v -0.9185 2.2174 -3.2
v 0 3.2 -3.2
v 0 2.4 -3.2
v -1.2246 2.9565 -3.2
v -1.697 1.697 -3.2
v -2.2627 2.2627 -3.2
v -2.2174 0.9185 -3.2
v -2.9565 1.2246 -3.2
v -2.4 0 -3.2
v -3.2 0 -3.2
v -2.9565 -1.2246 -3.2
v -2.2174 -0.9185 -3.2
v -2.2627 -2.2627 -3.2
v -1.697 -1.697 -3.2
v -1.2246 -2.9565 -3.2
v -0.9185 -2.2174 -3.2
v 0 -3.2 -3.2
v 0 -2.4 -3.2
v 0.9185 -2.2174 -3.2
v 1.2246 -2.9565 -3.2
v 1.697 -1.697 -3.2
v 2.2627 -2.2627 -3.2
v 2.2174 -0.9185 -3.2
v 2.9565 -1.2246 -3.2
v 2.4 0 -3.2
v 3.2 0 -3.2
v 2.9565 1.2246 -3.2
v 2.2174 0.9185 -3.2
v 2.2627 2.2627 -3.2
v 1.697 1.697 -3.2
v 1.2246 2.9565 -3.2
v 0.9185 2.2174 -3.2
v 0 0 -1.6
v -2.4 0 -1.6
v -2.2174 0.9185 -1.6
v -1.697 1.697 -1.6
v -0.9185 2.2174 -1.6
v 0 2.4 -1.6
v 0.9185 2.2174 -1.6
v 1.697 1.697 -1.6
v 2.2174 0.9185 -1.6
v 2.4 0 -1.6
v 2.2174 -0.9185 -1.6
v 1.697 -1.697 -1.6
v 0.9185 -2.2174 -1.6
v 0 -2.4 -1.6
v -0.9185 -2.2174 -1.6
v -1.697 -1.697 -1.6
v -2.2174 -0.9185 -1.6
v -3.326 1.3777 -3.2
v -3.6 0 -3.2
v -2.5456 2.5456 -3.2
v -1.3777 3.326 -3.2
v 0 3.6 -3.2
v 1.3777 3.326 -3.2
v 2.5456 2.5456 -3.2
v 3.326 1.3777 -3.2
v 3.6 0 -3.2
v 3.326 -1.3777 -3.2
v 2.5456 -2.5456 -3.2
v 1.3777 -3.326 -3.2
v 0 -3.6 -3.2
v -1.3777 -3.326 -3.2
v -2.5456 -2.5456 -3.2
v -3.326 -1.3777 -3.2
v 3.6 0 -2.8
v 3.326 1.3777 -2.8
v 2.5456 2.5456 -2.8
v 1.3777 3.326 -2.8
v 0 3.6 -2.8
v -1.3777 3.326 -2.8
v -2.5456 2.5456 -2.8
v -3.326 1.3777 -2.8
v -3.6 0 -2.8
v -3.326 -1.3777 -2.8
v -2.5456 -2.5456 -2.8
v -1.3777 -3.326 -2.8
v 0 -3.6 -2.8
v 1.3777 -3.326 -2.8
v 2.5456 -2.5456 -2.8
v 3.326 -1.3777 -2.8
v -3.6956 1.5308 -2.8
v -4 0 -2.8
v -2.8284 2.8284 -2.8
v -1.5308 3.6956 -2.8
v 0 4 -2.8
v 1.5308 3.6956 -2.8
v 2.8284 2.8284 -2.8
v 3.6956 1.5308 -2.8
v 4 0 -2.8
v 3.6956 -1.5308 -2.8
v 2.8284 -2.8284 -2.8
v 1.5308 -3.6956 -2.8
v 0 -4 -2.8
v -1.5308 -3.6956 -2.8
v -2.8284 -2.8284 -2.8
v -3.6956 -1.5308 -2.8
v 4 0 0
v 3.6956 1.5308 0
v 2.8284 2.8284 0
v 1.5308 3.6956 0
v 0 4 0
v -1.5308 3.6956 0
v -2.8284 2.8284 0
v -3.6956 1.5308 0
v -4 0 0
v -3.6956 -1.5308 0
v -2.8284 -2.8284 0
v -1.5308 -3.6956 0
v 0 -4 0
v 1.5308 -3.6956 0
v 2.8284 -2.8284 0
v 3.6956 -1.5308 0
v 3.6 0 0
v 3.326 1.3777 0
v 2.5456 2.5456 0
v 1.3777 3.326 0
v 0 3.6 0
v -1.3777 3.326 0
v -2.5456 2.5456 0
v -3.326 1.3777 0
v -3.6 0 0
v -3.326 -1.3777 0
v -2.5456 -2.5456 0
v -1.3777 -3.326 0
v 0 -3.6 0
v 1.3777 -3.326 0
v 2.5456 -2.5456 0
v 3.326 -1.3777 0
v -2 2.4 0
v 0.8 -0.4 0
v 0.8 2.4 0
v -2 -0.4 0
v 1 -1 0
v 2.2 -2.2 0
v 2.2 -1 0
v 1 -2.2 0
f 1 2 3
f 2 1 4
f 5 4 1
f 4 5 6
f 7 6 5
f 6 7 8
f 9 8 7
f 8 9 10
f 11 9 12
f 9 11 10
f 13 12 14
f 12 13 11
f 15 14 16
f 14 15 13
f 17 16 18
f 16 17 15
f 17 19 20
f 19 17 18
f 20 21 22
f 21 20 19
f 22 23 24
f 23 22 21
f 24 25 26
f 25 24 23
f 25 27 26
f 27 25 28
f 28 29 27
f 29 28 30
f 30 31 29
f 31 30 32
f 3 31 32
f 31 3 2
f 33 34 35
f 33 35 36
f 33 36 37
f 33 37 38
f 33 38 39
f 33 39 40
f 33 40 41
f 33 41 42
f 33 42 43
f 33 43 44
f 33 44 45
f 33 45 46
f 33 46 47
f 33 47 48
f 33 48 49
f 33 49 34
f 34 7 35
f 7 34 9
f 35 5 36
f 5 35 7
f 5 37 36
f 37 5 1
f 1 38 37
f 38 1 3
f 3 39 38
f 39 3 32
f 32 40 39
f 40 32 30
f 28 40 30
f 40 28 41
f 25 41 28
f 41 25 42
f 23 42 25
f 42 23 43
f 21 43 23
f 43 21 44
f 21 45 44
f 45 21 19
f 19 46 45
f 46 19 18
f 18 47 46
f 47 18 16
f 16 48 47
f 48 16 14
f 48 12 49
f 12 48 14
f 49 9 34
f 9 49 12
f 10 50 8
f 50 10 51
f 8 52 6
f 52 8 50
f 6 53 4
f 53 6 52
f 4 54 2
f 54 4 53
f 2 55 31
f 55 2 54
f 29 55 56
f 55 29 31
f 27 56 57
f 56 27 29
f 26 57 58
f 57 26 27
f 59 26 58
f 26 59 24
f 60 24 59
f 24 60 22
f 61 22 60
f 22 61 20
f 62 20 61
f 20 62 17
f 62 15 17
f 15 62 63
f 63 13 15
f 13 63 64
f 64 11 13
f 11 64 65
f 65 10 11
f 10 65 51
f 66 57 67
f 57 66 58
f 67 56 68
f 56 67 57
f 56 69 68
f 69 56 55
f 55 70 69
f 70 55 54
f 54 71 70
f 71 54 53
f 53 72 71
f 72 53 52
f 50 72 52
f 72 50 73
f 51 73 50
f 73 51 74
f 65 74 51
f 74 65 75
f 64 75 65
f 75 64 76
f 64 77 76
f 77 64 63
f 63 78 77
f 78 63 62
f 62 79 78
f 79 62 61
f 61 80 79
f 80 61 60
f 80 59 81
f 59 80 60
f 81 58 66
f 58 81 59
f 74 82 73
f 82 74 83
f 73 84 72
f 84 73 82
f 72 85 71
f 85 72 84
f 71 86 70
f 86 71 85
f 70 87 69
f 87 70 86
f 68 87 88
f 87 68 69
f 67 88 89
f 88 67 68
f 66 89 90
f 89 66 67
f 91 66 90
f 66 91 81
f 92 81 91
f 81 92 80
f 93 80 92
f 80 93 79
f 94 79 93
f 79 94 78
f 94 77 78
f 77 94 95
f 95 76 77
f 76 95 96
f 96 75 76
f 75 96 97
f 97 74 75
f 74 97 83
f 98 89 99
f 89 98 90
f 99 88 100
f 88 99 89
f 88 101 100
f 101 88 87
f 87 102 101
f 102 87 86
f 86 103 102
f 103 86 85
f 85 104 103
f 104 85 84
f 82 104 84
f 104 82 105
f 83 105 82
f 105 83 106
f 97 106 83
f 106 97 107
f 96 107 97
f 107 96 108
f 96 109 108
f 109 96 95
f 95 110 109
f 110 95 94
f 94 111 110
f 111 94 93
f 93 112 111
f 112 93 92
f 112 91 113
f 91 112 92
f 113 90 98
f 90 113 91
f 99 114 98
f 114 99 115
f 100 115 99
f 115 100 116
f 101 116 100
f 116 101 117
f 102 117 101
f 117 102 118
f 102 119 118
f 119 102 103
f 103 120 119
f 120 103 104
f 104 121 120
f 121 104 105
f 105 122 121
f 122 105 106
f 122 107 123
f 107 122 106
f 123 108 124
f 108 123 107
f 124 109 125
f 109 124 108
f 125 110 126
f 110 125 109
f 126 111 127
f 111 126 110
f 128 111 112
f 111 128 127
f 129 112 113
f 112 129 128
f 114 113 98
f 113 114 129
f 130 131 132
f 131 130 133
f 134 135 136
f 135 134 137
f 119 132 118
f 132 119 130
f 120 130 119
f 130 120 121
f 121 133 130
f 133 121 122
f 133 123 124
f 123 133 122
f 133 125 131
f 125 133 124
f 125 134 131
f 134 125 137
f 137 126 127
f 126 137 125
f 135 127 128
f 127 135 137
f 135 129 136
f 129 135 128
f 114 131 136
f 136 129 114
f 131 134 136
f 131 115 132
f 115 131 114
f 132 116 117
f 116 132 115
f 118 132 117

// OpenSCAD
// file: ../p/4-4disc.scad
use <../lib.scad>
function ldraw_lib__4_4disc() = [
// 0 Disc 1.0
// 0 Name: 4-4disc.dat
// 0 Author: James Jessiman
// 0 !LDRAW_ORG Primitive UPDATE 2002-02
// 0 !LICENSE Licensed under CC BY 4.0 : see CAreadme.txt
// 
// 0 BFC CERTIFY CCW
  [0,"BFC","CERTIFY"],
  [0,"BFC","CCW"],
// 
// 0 !HISTORY 1998-12-15 [PTadmin] Official Update 1998-10
// 0 !HISTORY 2002-03-23 [sbliss] Added BFC statement
// 0 !HISTORY 2002-04-25 [PTadmin] Official Update 2002-02
// 0 !HISTORY 2007-06-24 [PTadmin] Header formatted for Contributor Agreement
// 0 !HISTORY 2008-07-01 [PTadmin] Official Update 2008-01
// 
// 
// 3 16 0 0 0 1 0 0 0.9239 0 0.3827
  [3,16,0,0,0,1,0,0,0.9239,0,0.3827],
// 3 16 0 0 0 0.9239 0 0.3827 0.7071 0 0.7071
  [3,16,0,0,0,0.9239,0,0.3827,0.7071,0,0.7071],
// 3 16 0 0 0 0.7071 0 0.7071 0.3827 0 0.9239
  [3,16,0,0,0,0.7071,0,0.7071,0.3827,0,0.9239],
// 3 16 0 0 0 0.3827 0 0.9239 0 0 1
  [3,16,0,0,0,0.3827,0,0.9239,0,0,1],
// 3 16 0 0 0 0 0 1 -0.3827 0 0.9239
  [3,16,0,0,0,0,0,1,-0.3827,0,0.9239],
// 3 16 0 0 0 -0.3827 0 0.9239 -0.7071 0 0.7071
  [3,16,0,0,0,-0.3827,0,0.9239,-0.7071,0,0.7071],
// 3 16 0 0 0 -0.7071 0 0.7071 -0.9239 0 0.3827
  [3,16,0,0,0,-0.7071,0,0.7071,-0.9239,0,0.3827],
// 3 16 0 0 0 -0.9239 0 0.3827 -1 0 -0
  [3,16,0,0,0,-0.9239,0,0.3827,-1,0,-0],
// 3 16 0 0 0 -1 0 -0 -0.9239 0 -0.3827
  [3,16,0,0,0,-1,0,-0,-0.9239,0,-0.3827],
// 3 16 0 0 0 -0.9239 0 -0.3827 -0.7071 0 -0.7071
  [3,16,0,0,0,-0.9239,0,-0.3827,-0.7071,0,-0.7071],
// 3 16 0 0 0 -0.7071 0 -0.7071 -0.3827 0 -0.9239
  [3,16,0,0,0,-0.7071,0,-0.7071,-0.3827,0,-0.9239],
// 3 16 0 0 0 -0.3827 0 -0.9239 0 0 -1
  [3,16,0,0,0,-0.3827,0,-0.9239,0,0,-1],
// 3 16 0 0 0 0 0 -1 0.3827 0 -0.9239
  [3,16,0,0,0,0,0,-1,0.3827,0,-0.9239],
// 3 16 0 0 0 0.3827 0 -0.9239 0.7071 0 -0.7071
  [3,16,0,0,0,0.3827,0,-0.9239,0.7071,0,-0.7071],
// 3 16 0 0 0 0.7071 0 -0.7071 0.9239 0 -0.3827
  [3,16,0,0,0,0.7071,0,-0.7071,0.9239,0,-0.3827],
// 3 16 0 0 0 0.9239 0 -0.3827 1 0 0
  [3,16,0,0,0,0.9239,0,-0.3827,1,0,0],
// 0
];
module ldraw_lib__4_4disc(step=0, col=false, unit=2/5, alt=false, line=0.2, solid=!$preview)
    makepoly(ldraw_lib__4_4disc(), step=step, col=col, unit=unit, alt=alt, line=line, solid=solid);
ldraw_lib__4_4disc(line=0.2);
// file: ../p/4-4ring3.scad
use <../lib.scad>
function ldraw_lib__4_4ring3() = [
// 0 Ring  3 x 1.0
// 0 Name: 4-4ring3.dat
// 0 Author: James Jessiman
// 0 !LDRAW_ORG Primitive UPDATE 2009-01
// 0 !LICENSE Licensed under CC BY 4.0 : see CAreadme.txt
// 
// 0 BFC CERTIFY CCW
  [0,"BFC","CERTIFY"],
  [0,"BFC","CCW"],
// 
// 0 !HISTORY 1998-12-15 [PTadmin] Official Update 1998-10
// 0 !HISTORY 2002-04-05 [hafhead] Added BFC statement
// 0 !HISTORY 2002-04-25 [PTadmin] Official Update 2002-02
// 0 !HISTORY 2007-06-24 [PTadmin] Header formatted for Contributor Agreement
// 0 !HISTORY 2008-07-01 [PTadmin] Official Update 2008-01
// 0 !HISTORY 2008-08-26 [cwdee] Switch polygon winding and rename
// 0 !HISTORY 2009-05-02 [PTadmin] Official Update 2009-01
// 
// 
// 4 16 -1.5308 0 3.6956 -1.1481 0 2.7717 0 0 3 0 0 4
  [4,16,-1.5308,0,3.6956,-1.1481,0,2.7717,0,0,3,0,0,4],
// 4 16 -2.8284 0 2.8284 -2.1213 0 2.1213 -1.1481 0 2.7717 -1.5308 0 3.6956
  [4,16,-2.8284,0,2.8284,-2.1213,0,2.1213,-1.1481,0,2.7717,-1.5308,0,3.6956],
// 4 16 -3.6956 0 1.5308 -2.7717 0 1.1481 -2.1213 0 2.1213 -2.8284 0 2.8284
  [4,16,-3.6956,0,1.5308,-2.7717,0,1.1481,-2.1213,0,2.1213,-2.8284,0,2.8284],
// 4 16 -4 0 0 -3 0 0 -2.7717 0 1.1481 -3.6956 0 1.5308
  [4,16,-4,0,0,-3,0,0,-2.7717,0,1.1481,-3.6956,0,1.5308],
// 4 16 -3.6956 0 -1.5308 -2.7717 0 -1.1481 -3 0 0 -4 0 0
  [4,16,-3.6956,0,-1.5308,-2.7717,0,-1.1481,-3,0,0,-4,0,0],
// 4 16 -2.8284 0 -2.8284 -2.1213 0 -2.1213 -2.7717 0 -1.1481 -3.6956 0 -1.5308
  [4,16,-2.8284,0,-2.8284,-2.1213,0,-2.1213,-2.7717,0,-1.1481,-3.6956,0,-1.5308],
// 4 16 -1.5308 0 -3.6956 -1.1481 0 -2.7717 -2.1213 0 -2.1213 -2.8284 0 -2.8284
  [4,16,-1.5308,0,-3.6956,-1.1481,0,-2.7717,-2.1213,0,-2.1213,-2.8284,0,-2.8284],
// 4 16 0 0 -4 0 0 -3 -1.1481 0 -2.7717 -1.5308 0 -3.6956
  [4,16,0,0,-4,0,0,-3,-1.1481,0,-2.7717,-1.5308,0,-3.6956],
// 4 16 1.5308 0 -3.6956 1.1481 0 -2.7717 0 0 -3 0 0 -4
  [4,16,1.5308,0,-3.6956,1.1481,0,-2.7717,0,0,-3,0,0,-4],
// 4 16 2.8284 0 -2.8284 2.1213 0 -2.1213 1.1481 0 -2.7717 1.5308 0 -3.6956
  [4,16,2.8284,0,-2.8284,2.1213,0,-2.1213,1.1481,0,-2.7717,1.5308,0,-3.6956],
// 4 16 3.6956 0 -1.5308 2.7717 0 -1.1481 2.1213 0 -2.1213 2.8284 0 -2.8284
  [4,16,3.6956,0,-1.5308,2.7717,0,-1.1481,2.1213,0,-2.1213,2.8284,0,-2.8284],
// 4 16 4 0 0 3 0 0 2.7717 0 -1.1481 3.6956 0 -1.5308
  [4,16,4,0,0,3,0,0,2.7717,0,-1.1481,3.6956,0,-1.5308],
// 4 16 3.6956 0 1.5308 2.7717 0 1.1481 3 0 0 4 0 0
  [4,16,3.6956,0,1.5308,2.7717,0,1.1481,3,0,0,4,0,0],
// 4 16 2.8284 0 2.8284 2.1213 0 2.1213 2.7717 0 1.1481 3.6956 0 1.5308
  [4,16,2.8284,0,2.8284,2.1213,0,2.1213,2.7717,0,1.1481,3.6956,0,1.5308],
// 4 16 1.5308 0 3.6956 1.1481 0 2.7717 2.1213 0 2.1213 2.8284 0 2.8284
  [4,16,1.5308,0,3.6956,1.1481,0,2.7717,2.1213,0,2.1213,2.8284,0,2.8284],
// 4 16 0 0 4 0 0 3 1.1481 0 2.7717 1.5308 0 3.6956
  [4,16,0,0,4,0,0,3,1.1481,0,2.7717,1.5308,0,3.6956],
// 0
];
module ldraw_lib__4_4ring3(step=0, col=false, unit=2/5, alt=false, line=0.2, solid=!$preview)
    makepoly(ldraw_lib__4_4ring3(), step=step, col=col, unit=unit, alt=alt, line=line, solid=solid);
ldraw_lib__4_4ring3(line=0.2);
// file: ../p/4-4cylc.scad
use <../lib.scad>
use <4-4cyli.scad>
use <4-4disc.scad>
use <4-4edge.scad>
function ldraw_lib__4_4cylc() = [
// 0 Cylinder Closed 1.0
// 0 Name: 4-4cylc.dat
// 0 Author: Alex Taylor [anathema]
// 0 !LDRAW_ORG Primitive UPDATE 2009-02
// 0 !LICENSE Licensed under CC BY 4.0 : see CAreadme.txt
// 
// 0 BFC CERTIFY CCW
  [0,"BFC","CERTIFY"],
  [0,"BFC","CCW"],
// 
// 0 !HISTORY 2008-12-29 [cwdee] Removed one disc
// 0 !HISTORY 2009-09-03 [PTadmin] Official Update 2009-02
// 
// 
// 1 16 0 0 0 1 0 0 0 1 0 0 0 1 4-4edge.dat
  [1,16,0,0,0,1,0,0,0,1,0,0,0,1, ldraw_lib__4_4edge()],
// 1 16 0 1 0 1 0 0 0 1 0 0 0 1 4-4edge.dat
  [1,16,0,1,0,1,0,0,0,1,0,0,0,1, ldraw_lib__4_4edge()],
// 1 16 0 0 0 1 0 0 0 1 0 0 0 1 4-4disc.dat
  [1,16,0,0,0,1,0,0,0,1,0,0,0,1, ldraw_lib__4_4disc()],
// 1 16 0 0 0 1 0 0 0 1 0 0 0 1 4-4cyli.dat
  [1,16,0,0,0,1,0,0,0,1,0,0,0,1, ldraw_lib__4_4cyli()],
// 0
];
module ldraw_lib__4_4cylc(step=0, col=false, unit=2/5, alt=false, line=0.2, solid=!$preview)
    makepoly(ldraw_lib__4_4cylc(), step=step, col=col, unit=unit, alt=alt, line=line, solid=solid);
ldraw_lib__4_4cylc(line=0.2);
// file: ../p/4-4edge.scad
use <../lib.scad>
function ldraw_lib__4_4edge() = [
// 0 Circle 1.0
// 0 Name: 4-4edge.dat
// 0 Author: James Jessiman
// 0 !LDRAW_ORG Primitive UPDATE 2017-01
// 0 !LICENSE Licensed under CC BY 4.0 : see CAreadme.txt
// 
// 0 BFC CERTIFY CCW
  [0,"BFC","CERTIFY"],
  [0,"BFC","CCW"],
// 
// 0 !HISTORY 1998-12-15 [PTadmin] Official Update 1998-10
// 0 !HISTORY 2005-12-28 [PTadmin] Official Update 2005-01
// 0 !HISTORY 2007-06-24 [PTadmin] Header formatted for Contributor Agreement
// 0 !HISTORY 2008-07-01 [PTadmin] Official Update 2008-01
// 0 !HISTORY 2017-01-15 [Steffen] BFCed
// 0 !HISTORY 2017-12-30 [PTadmin] Official Update 2017-01
// 
// 
// 2 24 1 0 0 0.9239 0 0.3827
  [2,24,1,0,0,0.9239,0,0.3827],
// 2 24 0.9239 0 0.3827 0.7071 0 0.7071
  [2,24,0.9239,0,0.3827,0.7071,0,0.7071],
// 2 24 0.7071 0 0.7071 0.3827 0 0.9239
  [2,24,0.7071,0,0.7071,0.3827,0,0.9239],
// 2 24 0.3827 0 0.9239 0 0 1
  [2,24,0.3827,0,0.9239,0,0,1],
// 2 24 0 0 1 -0.3827 0 0.9239
  [2,24,0,0,1,-0.3827,0,0.9239],
// 2 24 -0.3827 0 0.9239 -0.7071 0 0.7071
  [2,24,-0.3827,0,0.9239,-0.7071,0,0.7071],
// 2 24 -0.7071 0 0.7071 -0.9239 0 0.3827
  [2,24,-0.7071,0,0.7071,-0.9239,0,0.3827],
// 2 24 -0.9239 0 0.3827 -1 0 -0
  [2,24,-0.9239,0,0.3827,-1,0,-0],
// 2 24 -1 0 -0 -0.9239 0 -0.3827
  [2,24,-1,0,-0,-0.9239,0,-0.3827],
// 2 24 -0.9239 0 -0.3827 -0.7071 0 -0.7071
  [2,24,-0.9239,0,-0.3827,-0.7071,0,-0.7071],
// 2 24 -0.7071 0 -0.7071 -0.3827 0 -0.9239
  [2,24,-0.7071,0,-0.7071,-0.3827,0,-0.9239],
// 2 24 -0.3827 0 -0.9239 0 0 -1
  [2,24,-0.3827,0,-0.9239,0,0,-1],
// 2 24 0 0 -1 0.3827 0 -0.9239
  [2,24,0,0,-1,0.3827,0,-0.9239],
// 2 24 0.3827 0 -0.9239 0.7071 0 -0.7071
  [2,24,0.3827,0,-0.9239,0.7071,0,-0.7071],
// 2 24 0.7071 0 -0.7071 0.9239 0 -0.3827
  [2,24,0.7071,0,-0.7071,0.9239,0,-0.3827],
// 2 24 0.9239 0 -0.3827 1 0 0
  [2,24,0.9239,0,-0.3827,1,0,0],
];
module ldraw_lib__4_4edge(step=0, col=false, unit=2/5, alt=false, line=0.2, solid=!$preview)
    makepoly(ldraw_lib__4_4edge(), step=step, col=col, unit=unit, alt=alt, line=line, solid=solid);
ldraw_lib__4_4edge(line=0.2);
// file: ../p/4-4cyli.scad
use <../lib.scad>
function ldraw_lib__4_4cyli() = [
// 0 Cylinder 1.0
// 0 Name: 4-4cyli.dat
// 0 Author: James Jessiman
// 0 !LDRAW_ORG Primitive UPDATE 2005-01
// 0 !LICENSE Licensed under CC BY 4.0 : see CAreadme.txt
// 
// 0 BFC CERTIFY CCW
  [0,"BFC","CERTIFY"],
  [0,"BFC","CCW"],
// 
// 0 !HISTORY 1998-12-15 [PTadmin] Official Update 1998-10
// 0 !HISTORY 2002-03-23 [sbliss] Added BFC statement; merged headers from files in distributions LDraw 0.27 and Complete.
// 0 !HISTORY 2002-04-25 [PTadmin] Official Update 2002-02
// 0 !HISTORY 2004-12-14 [guyvivan] BFC CCW
// 0 !HISTORY 2005-12-28 [PTadmin] Official Update 2005-01
// 0 !HISTORY 2007-06-24 [PTadmin] Header formatted for Contributor Agreement
// 0 !HISTORY 2008-07-01 [PTadmin] Official Update 2008-01
// 
// 
// 4 16 1 1 0 0.9239 1 0.3827 0.9239 0 0.3827 1 0 0
  [4,16,1,1,0,0.9239,1,0.3827,0.9239,0,0.3827,1,0,0],
// 5 24 1 0 0 1 1 0 0.9239 0 0.3827 0.9239 0 -0.3827
  [5,24,1,0,0,1,1,0,0.9239,0,0.3827,0.9239,0,-0.3827],
// 4 16 0.9239 1 0.3827 0.7071 1 0.7071 0.7071 0 0.7071 0.9239 0 0.3827
  [4,16,0.9239,1,0.3827,0.7071,1,0.7071,0.7071,0,0.7071,0.9239,0,0.3827],
// 5 24 0.9239 0 0.3827 0.9239 1 0.3827 0.7071 0 0.7071 1 0 0
  [5,24,0.9239,0,0.3827,0.9239,1,0.3827,0.7071,0,0.7071,1,0,0],
// 4 16 0.7071 1 0.7071 0.3827 1 0.9239 0.3827 0 0.9239 0.7071 0 0.7071
  [4,16,0.7071,1,0.7071,0.3827,1,0.9239,0.3827,0,0.9239,0.7071,0,0.7071],
// 5 24 0.7071 0 0.7071 0.7071 1 0.7071 0.3827 0 0.9239 0.9239 0 0.3827
  [5,24,0.7071,0,0.7071,0.7071,1,0.7071,0.3827,0,0.9239,0.9239,0,0.3827],
// 4 16 0.3827 1 0.9239 0 1 1 0 0 1 0.3827 0 0.9239
  [4,16,0.3827,1,0.9239,0,1,1,0,0,1,0.3827,0,0.9239],
// 5 24 0.3827 0 0.9239 0.3827 1 0.9239 0 0 1 0.7071 0 0.7071
  [5,24,0.3827,0,0.9239,0.3827,1,0.9239,0,0,1,0.7071,0,0.7071],
// 4 16 0 1 1 -0.3827 1 0.9239 -0.3827 0 0.9239 0 0 1
  [4,16,0,1,1,-0.3827,1,0.9239,-0.3827,0,0.9239,0,0,1],
// 5 24 0 0 1 0 1 1 -0.3827 0 0.9239 0.3827 0 0.9239
  [5,24,0,0,1,0,1,1,-0.3827,0,0.9239,0.3827,0,0.9239],
// 4 16 -0.3827 1 0.9239 -0.7071 1 0.7071 -0.7071 0 0.7071 -0.3827 0 0.9239
  [4,16,-0.3827,1,0.9239,-0.7071,1,0.7071,-0.7071,0,0.7071,-0.3827,0,0.9239],
// 5 24 -0.3827 0 0.9239 -0.3827 1 0.9239 -0.7071 0 0.7071 0 0 1
  [5,24,-0.3827,0,0.9239,-0.3827,1,0.9239,-0.7071,0,0.7071,0,0,1],
// 4 16 -0.7071 1 0.7071 -0.9239 1 0.3827 -0.9239 0 0.3827 -0.7071 0 0.7071
  [4,16,-0.7071,1,0.7071,-0.9239,1,0.3827,-0.9239,0,0.3827,-0.7071,0,0.7071],
// 5 24 -0.7071 0 0.7071 -0.7071 1 0.7071 -0.9239 0 0.3827 -0.3827 0 0.9239
  [5,24,-0.7071,0,0.7071,-0.7071,1,0.7071,-0.9239,0,0.3827,-0.3827,0,0.9239],
// 4 16 -0.9239 1 0.3827 -1 1 0 -1 0 0 -0.9239 0 0.3827
  [4,16,-0.9239,1,0.3827,-1,1,0,-1,0,0,-0.9239,0,0.3827],
// 5 24 -0.9239 0 0.3827 -0.9239 1 0.3827 -1 0 0 -0.7071 0 0.7071
  [5,24,-0.9239,0,0.3827,-0.9239,1,0.3827,-1,0,0,-0.7071,0,0.7071],
// 4 16 -1 1 0 -0.9239 1 -0.3827 -0.9239 0 -0.3827 -1 0 0
  [4,16,-1,1,0,-0.9239,1,-0.3827,-0.9239,0,-0.3827,-1,0,0],
// 5 24 -1 0 0 -1 1 0 -0.9239 0 -0.3827 -0.9239 0 0.3827
  [5,24,-1,0,0,-1,1,0,-0.9239,0,-0.3827,-0.9239,0,0.3827],
// 4 16 -0.9239 1 -0.3827 -0.7071 1 -0.7071 -0.7071 0 -0.7071 -0.9239 0 -0.3827
  [4,16,-0.9239,1,-0.3827,-0.7071,1,-0.7071,-0.7071,0,-0.7071,-0.9239,0,-0.3827],
// 5 24 -0.9239 0 -0.3827 -0.9239 1 -0.3827 -0.7071 0 -0.7071 -1 0 0
  [5,24,-0.9239,0,-0.3827,-0.9239,1,-0.3827,-0.7071,0,-0.7071,-1,0,0],
// 4 16 -0.7071 1 -0.7071 -0.3827 1 -0.9239 -0.3827 0 -0.9239 -0.7071 0 -0.7071
  [4,16,-0.7071,1,-0.7071,-0.3827,1,-0.9239,-0.3827,0,-0.9239,-0.7071,0,-0.7071],
// 5 24 -0.7071 0 -0.7071 -0.7071 1 -0.7071 -0.3827 0 -0.9239 -0.9239 0 -0.3827
  [5,24,-0.7071,0,-0.7071,-0.7071,1,-0.7071,-0.3827,0,-0.9239,-0.9239,0,-0.3827],
// 4 16 -0.3827 1 -0.9239 0 1 -1 0 0 -1 -0.3827 0 -0.9239
  [4,16,-0.3827,1,-0.9239,0,1,-1,0,0,-1,-0.3827,0,-0.9239],
// 5 24 -0.3827 0 -0.9239 -0.3827 1 -0.9239 0 0 -1 -0.7071 0 -0.7071
  [5,24,-0.3827,0,-0.9239,-0.3827,1,-0.9239,0,0,-1,-0.7071,0,-0.7071],
// 4 16 0 1 -1 0.3827 1 -0.9239 0.3827 0 -0.9239 0 0 -1
  [4,16,0,1,-1,0.3827,1,-0.9239,0.3827,0,-0.9239,0,0,-1],
// 5 24 0 0 -1 0 1 -1 0.3827 0 -0.9239 -0.3827 0 -0.9239
  [5,24,0,0,-1,0,1,-1,0.3827,0,-0.9239,-0.3827,0,-0.9239],
// 4 16 0.3827 1 -0.9239 0.7071 1 -0.7071 0.7071 0 -0.7071 0.3827 0 -0.9239
  [4,16,0.3827,1,-0.9239,0.7071,1,-0.7071,0.7071,0,-0.7071,0.3827,0,-0.9239],
// 5 24 0.3827 0 -0.9239 0.3827 1 -0.9239 0.7071 0 -0.7071 0 0 -1
  [5,24,0.3827,0,-0.9239,0.3827,1,-0.9239,0.7071,0,-0.7071,0,0,-1],
// 4 16 0.7071 1 -0.7071 0.9239 1 -0.3827 0.9239 0 -0.3827 0.7071 0 -0.7071
  [4,16,0.7071,1,-0.7071,0.9239,1,-0.3827,0.9239,0,-0.3827,0.7071,0,-0.7071],
// 5 24 0.7071 0 -0.7071 0.7071 1 -0.7071 0.9239 0 -0.3827 0.3827 0 -0.9239
  [5,24,0.7071,0,-0.7071,0.7071,1,-0.7071,0.9239,0,-0.3827,0.3827,0,-0.9239],
// 4 16 0.9239 1 -0.3827 1 1 0 1 0 0 0.9239 0 -0.3827
  [4,16,0.9239,1,-0.3827,1,1,0,1,0,0,0.9239,0,-0.3827],
// 5 24 0.9239 0 -0.3827 0.9239 1 -0.3827 1 0 0 0.7071 0 -0.7071
  [5,24,0.9239,0,-0.3827,0.9239,1,-0.3827,1,0,0,0.7071,0,-0.7071],
// 0
];
module ldraw_lib__4_4cyli(step=0, col=false, unit=2/5, alt=false, line=0.2, solid=!$preview)
    makepoly(ldraw_lib__4_4cyli(), step=step, col=col, unit=unit, alt=alt, line=line, solid=solid);
ldraw_lib__4_4cyli(line=0.2);
// file: ../p/empty.scad
use <../lib.scad>
function ldraw_lib__empty() = [
// 0 Empty
// 0 Name: empty.dat
// 0 Author: Steffen [Steffen]
// 0 !LDRAW_ORG Primitive UPDATE 2015-01
// 0 !LICENSE Licensed under CC BY 4.0 : see CAreadme.txt
// 
// 0 BFC CERTIFY CCW
  [0,"BFC","CERTIFY"],
  [0,"BFC","CCW"],
// 
// 0 !HISTORY 2015-10-11 [PTadmin] Official Update 2015-01
// 
// 
// 0 // Tool MLCad cannot handle really empty files. This file is used as a workaround.
// 0 // It exceptionally contains forbidden non-LDRAW standard syntax to satisfy MLCad until it is fixed OR a different editor has become the de-facto LDRAW standard.
// 0 // The line being used here is an "impossible" conditional line which never should be visible,
// 0 // additionally hidden by a syntax explicitly hiding it from displaying.
// 
// 0 MLCAD HIDE 5 24 0 0 0 0.0001 0 0 0.0001 -0.0001 0 0 0 0
];
module ldraw_lib__empty(step=0, col=false, unit=2/5, alt=false, line=0.2, solid=!$preview)
    makepoly(ldraw_lib__empty(), step=step, col=col, unit=unit, alt=alt, line=line, solid=solid);
ldraw_lib__empty(line=0.2);
// file: ../p/stud4o.scad
use <../lib.scad>
use <4-4cylc.scad>
use <4-4ring3.scad>
function ldraw_lib__stud4o() = [
// 0 Stud Tube Open without Outer Cylinder
// 0 Name: stud4o.dat
// 0 Author: Magnus Forsberg [MagFors]
// 0 !LDRAW_ORG Primitive UPDATE 2011-02
// 0 !LICENSE Licensed under CC BY 4.0 : see CAreadme.txt
// 
// 0 !HELP This stud is a "antistud" to be used like a underside stud,
// 0 !HELP but without the outer cylinder.
// 0 !HELP 1 47 0 0 0 1 0 0 0 1 0 0 0 1 stud4.dat
// 
// 0 BFC CERTIFY CCW
  [0,"BFC","CERTIFY"],
  [0,"BFC","CCW"],
// 
// 0 !HISTORY 2011-12-29 [PTadmin] Official Update 2011-02
// 
// 
// 1 16 0 -4 0 2 0 0 0 1 0 0 0 2 4-4ring3.dat
  [1,16,0,-4,0,2,0,0,0,1,0,0,0,2, ldraw_lib__4_4ring3()],
// 0 BFC INVERTNEXT
  [0,"BFC","INVERTNEXT"],
// 1 16 0 0 0 -6 0 0 0 -4 0 0 0 6 4-4cylc.dat
  [1,16,0,0,0,-6,0,0,0,-4,0,0,0,6, ldraw_lib__4_4cylc()],
];
module ldraw_lib__stud4o(step=0, col=false, unit=2/5, alt=false, line=0.2, solid=!$preview)
    makepoly(ldraw_lib__stud4o(), step=step, col=col, unit=unit, alt=alt, line=line, solid=solid);
ldraw_lib__stud4o(line=0.2);
// file: ../p/4-4ring8.scad
use <../lib.scad>
function ldraw_lib__4_4ring8() = [
// 0 Ring  8 x 1.0
// 0 Name: 4-4ring8.dat
// 0 Author: Steffen [Steffen]
// 0 !LDRAW_ORG Primitive UPDATE 2012-01
// 0 !LICENSE Licensed under CC BY 4.0 : see CAreadme.txt
// 
// 0 BFC CERTIFY CCW
  [0,"BFC","CERTIFY"],
  [0,"BFC","CCW"],
// 
// 0 !HISTORY 2003-12-19 [PTadmin] Official Update 2003-03
// 0 !HISTORY 2007-06-24 [PTadmin] Header formatted for Contributor Agreement
// 0 !HISTORY 2008-07-01 [PTadmin] Official Update 2008-01
// 0 !HISTORY 2012-02-16 [Philo] Changed to CCW
// 0 !HISTORY 2012-03-30 [PTadmin] Official Update 2012-01
// 
// 
// 4 16 9 0 0 8.3151 0 3.4443 7.3912 0 3.0616 8 0 0
  [4,16,9,0,0,8.3151,0,3.4443,7.3912,0,3.0616,8,0,0],
// 4 16 8.3151 0 3.4443 6.3639 0 6.3639 5.6568 0 5.6568 7.3912 0 3.0616
  [4,16,8.3151,0,3.4443,6.3639,0,6.3639,5.6568,0,5.6568,7.3912,0,3.0616],
// 4 16 6.3639 0 6.3639 3.4443 0 8.3151 3.0616 0 7.3912 5.6568 0 5.6568
  [4,16,6.3639,0,6.3639,3.4443,0,8.3151,3.0616,0,7.3912,5.6568,0,5.6568],
// 4 16 3.4443 0 8.3151 0 0 9 0 0 8 3.0616 0 7.3912
  [4,16,3.4443,0,8.3151,0,0,9,0,0,8,3.0616,0,7.3912],
// 4 16 0 0 9 -3.4443 0 8.3151 -3.0616 0 7.3912 0 0 8
  [4,16,0,0,9,-3.4443,0,8.3151,-3.0616,0,7.3912,0,0,8],
// 4 16 -3.4443 0 8.3151 -6.3639 0 6.3639 -5.6568 0 5.6568 -3.0616 0 7.3912
  [4,16,-3.4443,0,8.3151,-6.3639,0,6.3639,-5.6568,0,5.6568,-3.0616,0,7.3912],
// 4 16 -6.3639 0 6.3639 -8.3151 0 3.4443 -7.3912 0 3.0616 -5.6568 0 5.6568
  [4,16,-6.3639,0,6.3639,-8.3151,0,3.4443,-7.3912,0,3.0616,-5.6568,0,5.6568],
// 4 16 -8.3151 0 3.4443 -9 0 0 -8 0 0 -7.3912 0 3.0616
  [4,16,-8.3151,0,3.4443,-9,0,0,-8,0,0,-7.3912,0,3.0616],
// 4 16 -9 0 0 -8.3151 0 -3.4443 -7.3912 0 -3.0616 -8 0 0
  [4,16,-9,0,0,-8.3151,0,-3.4443,-7.3912,0,-3.0616,-8,0,0],
// 4 16 -8.3151 0 -3.4443 -6.3639 0 -6.3639 -5.6568 0 -5.6568 -7.3912 0 -3.0616
  [4,16,-8.3151,0,-3.4443,-6.3639,0,-6.3639,-5.6568,0,-5.6568,-7.3912,0,-3.0616],
// 4 16 -6.3639 0 -6.3639 -3.4443 0 -8.3151 -3.0616 0 -7.3912 -5.6568 0 -5.6568
  [4,16,-6.3639,0,-6.3639,-3.4443,0,-8.3151,-3.0616,0,-7.3912,-5.6568,0,-5.6568],
// 4 16 -3.4443 0 -8.3151 0 0 -9 0 0 -8 -3.0616 0 -7.3912
  [4,16,-3.4443,0,-8.3151,0,0,-9,0,0,-8,-3.0616,0,-7.3912],
// 4 16 0 0 -9 3.4443 0 -8.3151 3.0616 0 -7.3912 0 0 -8
  [4,16,0,0,-9,3.4443,0,-8.3151,3.0616,0,-7.3912,0,0,-8],
// 4 16 3.4443 0 -8.3151 6.3639 0 -6.3639 5.6568 0 -5.6568 3.0616 0 -7.3912
  [4,16,3.4443,0,-8.3151,6.3639,0,-6.3639,5.6568,0,-5.6568,3.0616,0,-7.3912],
// 4 16 6.3639 0 -6.3639 8.3151 0 -3.4443 7.3912 0 -3.0616 5.6568 0 -5.6568
  [4,16,6.3639,0,-6.3639,8.3151,0,-3.4443,7.3912,0,-3.0616,5.6568,0,-5.6568],
// 4 16 8.3151 0 -3.4443 9 0 0 8 0 0 7.3912 0 -3.0616
  [4,16,8.3151,0,-3.4443,9,0,0,8,0,0,7.3912,0,-3.0616],
];
module ldraw_lib__4_4ring8(step=0, col=false, unit=2/5, alt=false, line=0.2, solid=!$preview)
    makepoly(ldraw_lib__4_4ring8(), step=step, col=col, unit=unit, alt=alt, line=line, solid=solid);
ldraw_lib__4_4ring8(line=0.2);
// file: ../p/4-4cylo.scad
use <../lib.scad>
use <4-4cyli.scad>
use <4-4edge.scad>
function ldraw_lib__4_4cylo() = [
// 0 Cylinder Open 1.0
// 0 Name: 4-4cylo.dat
// 0 Author: Mark Kennedy [mkennedy]
// 0 !LDRAW_ORG Primitive UPDATE 2010-01
// 0 !LICENSE Licensed under CC BY 4.0 : see CAreadme.txt
// 
// 0 BFC CERTIFY CCW
  [0,"BFC","CERTIFY"],
  [0,"BFC","CCW"],
// 
// 0 !HISTORY 2010-04-05 [PTadmin] Official Update 2010-01
// 
// 
// 1 16 0 0 0 1 0 0 0 1 0 0 0 1 4-4edge.dat
  [1,16,0,0,0,1,0,0,0,1,0,0,0,1, ldraw_lib__4_4edge()],
// 1 16 0 1 0 1 0 0 0 1 0 0 0 1 4-4edge.dat
  [1,16,0,1,0,1,0,0,0,1,0,0,0,1, ldraw_lib__4_4edge()],
// 1 16 0 0 0 1 0 0 0 1 0 0 0 1 4-4cyli.dat
  [1,16,0,0,0,1,0,0,0,1,0,0,0,1, ldraw_lib__4_4cyli()],
// 0
];
module ldraw_lib__4_4cylo(step=0, col=false, unit=2/5, alt=false, line=0.2, solid=!$preview)
    makepoly(ldraw_lib__4_4cylo(), step=step, col=col, unit=unit, alt=alt, line=line, solid=solid);
ldraw_lib__4_4cylo(line=0.2);
// file: ../p/1-16chrd.scad
use <../lib.scad>
use <empty.scad>
function ldraw_lib__1_16chrd() = [
// 0 Chord 0.0625
// 0 Name: 1-16chrd.dat
// 0 Author: Philippe Hurbain [Philo]
// 0 !LDRAW_ORG Primitive UPDATE 2015-01
// 0 !LICENSE Licensed under CC BY 4.0 : see CAreadme.txt
// 
// 0 BFC CERTIFY CCW
  [0,"BFC","CERTIFY"],
  [0,"BFC","CCW"],
// 
// 0 !HISTORY 2015-10-11 [PTadmin] Official Update 2015-01
// 
// 
// 0 // This file is intentionally empty because at the current \P resolution,
// 0 // an 1-16chrd is actually empty. However, this file still is present
// 0 // to allow tools to do primitives substition and fill in a real chrd here,
// 0 // or, if desired, to substitute this with the hi-res 48\1-16chrd.
// 
// 0 // This file is based on an idea by Darats at http://forums.ldraw.org/read.php?19,14500,14500#msg-14500
// 
// 1 16 0 0 0 1 0 0 0 1 0 0 0 1 empty.dat
  [1,16,0,0,0,1,0,0,0,1,0,0,0,1, ldraw_lib__empty()],
];
module ldraw_lib__1_16chrd(step=0, col=false, unit=2/5, alt=false, line=0.2, solid=!$preview)
    makepoly(ldraw_lib__1_16chrd(), step=step, col=col, unit=unit, alt=alt, line=line, solid=solid);
ldraw_lib__1_16chrd(line=0.2);
// file: s/98138s02.scad
use <../../lib.scad>
use <../../p/4-4cylo.scad>
use <../../p/4-4ring8.scad>
use <../../p/4-4ring9.scad>
use <../../p/stud4o.scad>
function ldraw_lib__s__98138s02() = [
// 0 ~Tile  1 x  1 Round with Groove without Complete Top Face
// 0 Name: s\98138s02.dat
// 0 Author: Magnus Forsberg [MagFors]
// 0 !LDRAW_ORG Subpart UPDATE 2020-01
// 0 !LICENSE Licensed under CC BY 4.0 : see CAreadme.txt
// 
// 0 BFC CERTIFY CCW
  [0,"BFC","CERTIFY"],
  [0,"BFC","CCW"],
// 
// 0 !HISTORY 2020-06-28 [PTadmin] Official Update 2020-01
// 
// 
// 1 16 0 4 0 1 0 0 0 -1 0 0 0 1 stud4o.dat
  [1,16,0,4,0,1,0,0,0,-1,0,0,0,1, ldraw_lib__stud4o()],
// 1 16 0 8 0 -1 0 0 0 -1 0 0 0 1 4-4ring8.dat
  [1,16,0,8,0,-1,0,0,0,-1,0,0,0,1, ldraw_lib__4_4ring8()],
// 1 16 0 7 0 9 0 0 0 1 0 0 0 9 4-4cylo.dat
  [1,16,0,7,0,9,0,0,0,1,0,0,0,9, ldraw_lib__4_4cylo()],
// 1 16 0 7 0 -1 0 0 0 -1 0 0 0 1 4-4ring9.dat
  [1,16,0,7,0,-1,0,0,0,-1,0,0,0,1, ldraw_lib__4_4ring9()],
// 1 16 0 0 0 10 0 0 0 7 0 0 0 10 4-4cylo.dat
  [1,16,0,0,0,10,0,0,0,7,0,0,0,10, ldraw_lib__4_4cylo()],
];
module ldraw_lib__s__98138s02(step=0, col=false, unit=2/5, alt=false, line=0.2, solid=!$preview)
    makepoly(ldraw_lib__s__98138s02(), step=step, col=col, unit=unit, alt=alt, line=line, solid=solid);
ldraw_lib__s__98138s02(line=0.2);
// file: ../p/4-4ring9.scad
use <../lib.scad>
function ldraw_lib__4_4ring9() = [
// 0 Ring  9 x 1.0
// 0 Name: 4-4ring9.dat
// 0 Author: Magnus Forsberg [MagFors]
// 0 !LDRAW_ORG Primitive UPDATE 2024-01
// 0 !LICENSE Licensed under CC BY 4.0 : see CAreadme.txt
// 
// 0 BFC CERTIFY CCW
  [0,"BFC","CERTIFY"],
  [0,"BFC","CCW"],
// 
// 0 !HISTORY 2004-04-22 [PTadmin] Official Update 2004-02
// 0 !HISTORY 2007-06-24 [PTadmin] Header formatted for Contributor Agreement
// 0 !HISTORY 2008-07-01 [PTadmin] Official Update 2008-01
// 0 !HISTORY 2024-01-04 [MagFors] Complete regeneration, original by jriley
// 0 !HISTORY 2024-01-29 [OrionP] Official Update 2024-01
// 
// 4 16 10 0 0 9.239 0 3.827 8.3151 0 3.4443 9 0 0
  [4,16,10,0,0,9.239,0,3.827,8.3151,0,3.4443,9,0,0],
// 4 16 9.239 0 3.827 7.071 0 7.071 6.3639 0 6.3639 8.3151 0 3.4443
  [4,16,9.239,0,3.827,7.071,0,7.071,6.3639,0,6.3639,8.3151,0,3.4443],
// 4 16 7.071 0 7.071 3.827 0 9.239 3.4443 0 8.3151 6.3639 0 6.3639
  [4,16,7.071,0,7.071,3.827,0,9.239,3.4443,0,8.3151,6.3639,0,6.3639],
// 4 16 3.827 0 9.239 0 0 10 0 0 9 3.4443 0 8.3151
  [4,16,3.827,0,9.239,0,0,10,0,0,9,3.4443,0,8.3151],
// 4 16 0 0 10 -3.827 0 9.239 -3.4443 0 8.3151 0 0 9
  [4,16,0,0,10,-3.827,0,9.239,-3.4443,0,8.3151,0,0,9],
// 4 16 -3.827 0 9.239 -7.071 0 7.071 -6.3639 0 6.3639 -3.4443 0 8.3151
  [4,16,-3.827,0,9.239,-7.071,0,7.071,-6.3639,0,6.3639,-3.4443,0,8.3151],
// 4 16 -7.071 0 7.071 -9.239 0 3.827 -8.3151 0 3.4443 -6.3639 0 6.3639
  [4,16,-7.071,0,7.071,-9.239,0,3.827,-8.3151,0,3.4443,-6.3639,0,6.3639],
// 4 16 -9.239 0 3.827 -10 0 0 -9 0 0 -8.3151 0 3.4443
  [4,16,-9.239,0,3.827,-10,0,0,-9,0,0,-8.3151,0,3.4443],
// 4 16 -10 0 0 -9.239 0 -3.827 -8.3151 0 -3.4443 -9 0 0
  [4,16,-10,0,0,-9.239,0,-3.827,-8.3151,0,-3.4443,-9,0,0],
// 4 16 -9.239 0 -3.827 -7.071 0 -7.071 -6.3639 0 -6.3639 -8.3151 0 -3.4443
  [4,16,-9.239,0,-3.827,-7.071,0,-7.071,-6.3639,0,-6.3639,-8.3151,0,-3.4443],
// 4 16 -7.071 0 -7.071 -3.827 0 -9.239 -3.4443 0 -8.3151 -6.3639 0 -6.3639
  [4,16,-7.071,0,-7.071,-3.827,0,-9.239,-3.4443,0,-8.3151,-6.3639,0,-6.3639],
// 4 16 -3.827 0 -9.239 0 0 -10 0 0 -9 -3.4443 0 -8.3151
  [4,16,-3.827,0,-9.239,0,0,-10,0,0,-9,-3.4443,0,-8.3151],
// 4 16 0 0 -10 3.827 0 -9.239 3.4443 0 -8.3151 0 0 -9
  [4,16,0,0,-10,3.827,0,-9.239,3.4443,0,-8.3151,0,0,-9],
// 4 16 3.827 0 -9.239 7.071 0 -7.071 6.3639 0 -6.3639 3.4443 0 -8.3151
  [4,16,3.827,0,-9.239,7.071,0,-7.071,6.3639,0,-6.3639,3.4443,0,-8.3151],
// 4 16 7.071 0 -7.071 9.239 0 -3.827 8.3151 0 -3.4443 6.3639 0 -6.3639
  [4,16,7.071,0,-7.071,9.239,0,-3.827,8.3151,0,-3.4443,6.3639,0,-6.3639],
// 4 16 9.239 0 -3.827 10 0 0 9 0 0 8.3151 0 -3.4443
  [4,16,9.239,0,-3.827,10,0,0,9,0,0,8.3151,0,-3.4443],
// 0 // Build by LDPartEditor (PrimGen 2.X)
];
module ldraw_lib__4_4ring9(step=0, col=false, unit=2/5, alt=false, line=0.2, solid=!$preview)
    makepoly(ldraw_lib__4_4ring9(), step=step, col=col, unit=unit, alt=alt, line=line, solid=solid);
ldraw_lib__4_4ring9(line=0.2);
// file: ../p/4-4ering.scad
use <../lib.scad>
use <1-16chrd.scad>
function ldraw_lib__4_4ering() = [
// 0 Adapter Ring Triangles to Normal 1.0
// 0 Name: 4-4ering.dat
// 0 Author: Philippe Hurbain [Philo]
// 0 !LDRAW_ORG Primitive UPDATE 2015-01
// 0 !LICENSE Licensed under CC BY 4.0 : see CAreadme.txt
// 
// 0 BFC CERTIFY CCW
  [0,"BFC","CERTIFY"],
  [0,"BFC","CCW"],
// 
// 0 !HISTORY 2015-10-11 [PTadmin] Official Update 2015-01
// 
// 
// 0 // This file uses 1-16chrd (actually empty). It allows
// 0 // tools to do primitives substition and fill in a ring of chrd here,
// 0 // or, if desired, to substitute this with the hi-res 48\1-16chrd.
// 0 // This file is based on an idea by Darats at http://forums.ldraw.org/read.php?19,14500,14500#msg-14500
// 
// 1 16 0 0 0 1 0 0 0 1 0 0 0 1 1-16chrd.dat
  [1,16,0,0,0,1,0,0,0,1,0,0,0,1, ldraw_lib__1_16chrd()],
// 1 16 0 0 0 0.92388 0 0.38268 0 1 0 -0.38268 0 0.92388 1-16chrd.dat
  [1,16,0,0,0,0.92388,0,0.38268,0,1,0,-0.38268,0,0.92388, ldraw_lib__1_16chrd()],
// 1 16 0 0 0 0.70711 0 0.70711 0 1 0 -0.70711 0 0.70711 1-16chrd.dat
  [1,16,0,0,0,0.70711,0,0.70711,0,1,0,-0.70711,0,0.70711, ldraw_lib__1_16chrd()],
// 1 16 0 0 0 0.38268 0 0.92388 0 1 0 -0.92388 0 0.38268 1-16chrd.dat
  [1,16,0,0,0,0.38268,0,0.92388,0,1,0,-0.92388,0,0.38268, ldraw_lib__1_16chrd()],
// 1 16 0 0 0 0 0 1 0 1 0 -1 0 0 1-16chrd.dat
  [1,16,0,0,0,0,0,1,0,1,0,-1,0,0, ldraw_lib__1_16chrd()],
// 1 16 0 0 0 -0.38268 0 0.92388 0 1 0 -0.92388 0 -0.38268 1-16chrd.dat
  [1,16,0,0,0,-0.38268,0,0.92388,0,1,0,-0.92388,0,-0.38268, ldraw_lib__1_16chrd()],
// 1 16 0 0 0 -0.70711 0 0.70711 0 1 0 -0.70711 0 -0.70711 1-16chrd.dat
  [1,16,0,0,0,-0.70711,0,0.70711,0,1,0,-0.70711,0,-0.70711, ldraw_lib__1_16chrd()],
// 1 16 0 0 0 -0.92388 0 0.38268 0 1 0 -0.38268 0 -0.92388 1-16chrd.dat
  [1,16,0,0,0,-0.92388,0,0.38268,0,1,0,-0.38268,0,-0.92388, ldraw_lib__1_16chrd()],
// 1 16 0 0 0 0 0 -1 0 1 0 1 0 0 1-16chrd.dat
  [1,16,0,0,0,0,0,-1,0,1,0,1,0,0, ldraw_lib__1_16chrd()],
// 1 16 0 0 0 0.38268 0 -0.92388 0 1 0 0.92388 0 0.38268 1-16chrd.dat
  [1,16,0,0,0,0.38268,0,-0.92388,0,1,0,0.92388,0,0.38268, ldraw_lib__1_16chrd()],
// 1 16 0 0 0 0.70711 0 -0.70711 0 1 0 0.70711 0 0.70711 1-16chrd.dat
  [1,16,0,0,0,0.70711,0,-0.70711,0,1,0,0.70711,0,0.70711, ldraw_lib__1_16chrd()],
// 1 16 0 0 0 0.92388 0 -0.38268 0 1 0 0.38268 0 0.92388 1-16chrd.dat
  [1,16,0,0,0,0.92388,0,-0.38268,0,1,0,0.38268,0,0.92388, ldraw_lib__1_16chrd()],
// 1 16 0 0 0 -1 0 0 0 1 0 0 0 -1 1-16chrd.dat
  [1,16,0,0,0,-1,0,0,0,1,0,0,0,-1, ldraw_lib__1_16chrd()],
// 1 16 0 0 0 -0.92388 0 -0.38268 0 1 0 0.38268 0 -0.92388 1-16chrd.dat
  [1,16,0,0,0,-0.92388,0,-0.38268,0,1,0,0.38268,0,-0.92388, ldraw_lib__1_16chrd()],
// 1 16 0 0 0 -0.70711 0 -0.70711 0 1 0 0.70711 0 -0.70711 1-16chrd.dat
  [1,16,0,0,0,-0.70711,0,-0.70711,0,1,0,0.70711,0,-0.70711, ldraw_lib__1_16chrd()],
// 1 16 0 0 0 -0.38268 0 -0.92388 0 1 0 0.92388 0 -0.38268 1-16chrd.dat
  [1,16,0,0,0,-0.38268,0,-0.92388,0,1,0,0.92388,0,-0.38268, ldraw_lib__1_16chrd()],
];
module ldraw_lib__4_4ering(step=0, col=false, unit=2/5, alt=false, line=0.2, solid=!$preview)
    makepoly(ldraw_lib__4_4ering(), step=step, col=col, unit=unit, alt=alt, line=line, solid=solid);
ldraw_lib__4_4ering(line=0.2);
// file: s/98138s01.scad
use <../../lib.scad>
use <../../p/4-4ring9.scad>
use <98138s02.scad>
function ldraw_lib__s__98138s01() = [
// 0 ~Tile  1 x  1 Round with Groove with Partial Top Face
// 0 Name: s\98138s01.dat
// 0 Author: Magnus Forsberg [MagFors]
// 0 !LDRAW_ORG Subpart UPDATE 2020-01
// 0 !LICENSE Licensed under CC BY 4.0 : see CAreadme.txt
// 
// 0 BFC CERTIFY CCW
  [0,"BFC","CERTIFY"],
  [0,"BFC","CCW"],
// 
// 0 !HISTORY 2011-12-29 [PTadmin] Official Update 2011-02
// 0 !HISTORY 2016-06-17 [MagFors] Reduced the rounded edge to 0.5 ldu
// 0 !HISTORY 2016-12-31 [PTadmin] Official Update 2016-01
// 0 !HISTORY 2019-06-17 [MagFors] Removed the rounded edge
// 0 !HISTORY 2019-07-19 [MagFors] Subfiled without top surface
// 0 !HISTORY 2020-06-28 [PTadmin] Official Update 2020-01
// 
// 
// 1 16 0 0 0 1 0 0 0 1 0 0 0 1 s\98138s02.dat
  [1,16,0,0,0,1,0,0,0,1,0,0,0,1, ldraw_lib__s__98138s02()],
// 1 16 0 0 0 1 0 0 0 1 0 0 0 1 4-4ring9.dat
  [1,16,0,0,0,1,0,0,0,1,0,0,0,1, ldraw_lib__4_4ring9()],
];
module ldraw_lib__s__98138s01(step=0, col=false, unit=2/5, alt=false, line=0.2, solid=!$preview)
    makepoly(ldraw_lib__s__98138s01(), step=step, col=col, unit=unit, alt=alt, line=line, solid=solid);
ldraw_lib__s__98138s01(line=0.2);
// file: s/98138pz0s01.scad
use <../../lib.scad>
use <../../p/4-4ering.scad>
function ldraw_lib__s__98138pz0s01() = [
// 0 ~Tile  1 x  1 Round with Two White Squares Pattern
// 0 Name: s\98138pz0s01.dat
// 0 Author: Vincent Messenet [Cheenzo]
// 0 !LDRAW_ORG Subpart UPDATE 2023-03
// 0 !LICENSE Licensed under CC BY 4.0 : see CAreadme.txt
// 
// 0 BFC CERTIFY CCW
  [0,"BFC","CERTIFY"],
  [0,"BFC","CCW"],
// 
// 0 !HISTORY 2023-06-24 [OrionP] Official Update 2023-03
// 
// 
// 1 16 0 0 0 9 0 0 0 1 0 0 0 9 4-4ering.dat
  [1,16,0,0,0,9,0,0,0,1,0,0,0,9, ldraw_lib__4_4ering()],
// 
// 4 15 -5 0 6 -5 0 -1 2 0 -1 2 0 6
  [4,15,-5,0,6,-5,0,-1,2,0,-1,2,0,6],
// 4 15 2.5 0 -2.5 2.5 0 -5.5 5.5 0 -5.5 5.5 0 -2.5
  [4,15,2.5,0,-2.5,2.5,0,-5.5,5.5,0,-5.5,5.5,0,-2.5],
// 4 16 -5 0 6 2 0 6 0 0 9 -3.4443 0 8.3151
  [4,16,-5,0,6,2,0,6,0,0,9,-3.4443,0,8.3151],
// 4 16 -8.3151 0 3.4443 -5 0 6 -3.4443 0 8.3151 -6.3639 0 6.3639
  [4,16,-8.3151,0,3.4443,-5,0,6,-3.4443,0,8.3151,-6.3639,0,6.3639],
// 4 16 -5 0 -1 -5 0 6 -8.3151 0 3.4443 -9 0 0
  [4,16,-5,0,-1,-5,0,6,-8.3151,0,3.4443,-9,0,0],
// 4 16 -5 0 -1 -9 0 0 -8.3151 0 -3.4443 -6.3639 0 -6.3639
  [4,16,-5,0,-1,-9,0,0,-8.3151,0,-3.4443,-6.3639,0,-6.3639],
// 4 16 -5 0 -1 -6.3639 0 -6.3639 -3.4443 0 -8.3151 2 0 -1
  [4,16,-5,0,-1,-6.3639,0,-6.3639,-3.4443,0,-8.3151,2,0,-1],
// 4 16 2.5 0 -2.5 2 0 -1 -3.4443 0 -8.3151 2.5 0 -5.5
  [4,16,2.5,0,-2.5,2,0,-1,-3.4443,0,-8.3151,2.5,0,-5.5],
// 4 16 2.5 0 -5.5 -3.4443 0 -8.3151 0 0 -9 3.4443 0 -8.3151
  [4,16,2.5,0,-5.5,-3.4443,0,-8.3151,0,0,-9,3.4443,0,-8.3151],
// 4 16 5.5 0 -5.5 2.5 0 -5.5 3.4443 0 -8.3151 6.3639 0 -6.3639
  [4,16,5.5,0,-5.5,2.5,0,-5.5,3.4443,0,-8.3151,6.3639,0,-6.3639],
// 4 16 5.5 0 -5.5 6.3639 0 -6.3639 8.3151 0 -3.4443 5.5 0 -2.5
  [4,16,5.5,0,-5.5,6.3639,0,-6.3639,8.3151,0,-3.4443,5.5,0,-2.5],
// 3 16 9 0 0 2 0 -1 5.5 0 -2.5
  [3,16,9,0,0,2,0,-1,5.5,0,-2.5],
// 3 16 5.5 0 -2.5 8.3151 0 -3.4443 9 0 0
  [3,16,5.5,0,-2.5,8.3151,0,-3.4443,9,0,0],
// 3 16 2 0 -1 2.5 0 -2.5 5.5 0 -2.5
  [3,16,2,0,-1,2.5,0,-2.5,5.5,0,-2.5],
// 4 16 2 0 6 2 0 -1 9 0 0 8.3151 0 3.4443
  [4,16,2,0,6,2,0,-1,9,0,0,8.3151,0,3.4443],
// 4 16 2 0 6 8.3151 0 3.4443 6.3639 0 6.3639 3.4443 0 8.3151
  [4,16,2,0,6,8.3151,0,3.4443,6.3639,0,6.3639,3.4443,0,8.3151],
// 3 16 0 0 9 2 0 6 3.4443 0 8.3151
  [3,16,0,0,9,2,0,6,3.4443,0,8.3151],
];
module ldraw_lib__s__98138pz0s01(step=0, col=false, unit=2/5, alt=false, line=0.2, solid=!$preview)
    makepoly(ldraw_lib__s__98138pz0s01(), step=step, col=col, unit=unit, alt=alt, line=line, solid=solid);
ldraw_lib__s__98138pz0s01(line=0.2);
// main file
use <../lib.scad>
use <s/98138pz0s01.scad>
use <s/98138s01.scad>
function ldraw_lib__98138pz2() = [
// 0 Tile  1 x  1 Round with Two White Squares Within Metallic Gold Round Pattern
// 0 Name: 98138pz2.dat
// 0 Author: Vincent Messenet [Cheenzo]
// 0 !LDRAW_ORG Part UPDATE 2023-03
// 0 !LICENSE Licensed under CC BY 4.0 : see CAreadme.txt
// 
// 0 BFC CERTIFY CCW
  [0,"BFC","CERTIFY"],
  [0,"BFC","CCW"],
// 
// 0 !KEYWORDS Brickheadz, BrickLink 98138pb072, Eye, Monkey King
// 0 !KEYWORDS Rebrickable 98138pr0060, Set 40381
// 
// 0 !HISTORY 2023-06-24 [OrionP] Official Update 2023-03
// 
// 
// 1 16 0 0 0 1 0 0 0 1 0 0 0 1 s\98138s01.dat
  [1,16,0,0,0,1,0,0,0,1,0,0,0,1, ldraw_lib__s__98138s01()],
// 1 82 0 0 0 1 0 0 0 1 0 0 0 1 s\98138pz0s01.dat
  [1,82,0,0,0,1,0,0,0,1,0,0,0,1, ldraw_lib__s__98138pz0s01()],
];
module ldraw_lib__98138pz2(step=0, col=false, unit=2/5, alt=false, line=0.2, solid=!$preview)
    makepoly(ldraw_lib__98138pz2(), step=step, col=col, unit=unit, alt=alt, line=line, solid=solid);
ldraw_lib__98138pz2(line=0.2);
